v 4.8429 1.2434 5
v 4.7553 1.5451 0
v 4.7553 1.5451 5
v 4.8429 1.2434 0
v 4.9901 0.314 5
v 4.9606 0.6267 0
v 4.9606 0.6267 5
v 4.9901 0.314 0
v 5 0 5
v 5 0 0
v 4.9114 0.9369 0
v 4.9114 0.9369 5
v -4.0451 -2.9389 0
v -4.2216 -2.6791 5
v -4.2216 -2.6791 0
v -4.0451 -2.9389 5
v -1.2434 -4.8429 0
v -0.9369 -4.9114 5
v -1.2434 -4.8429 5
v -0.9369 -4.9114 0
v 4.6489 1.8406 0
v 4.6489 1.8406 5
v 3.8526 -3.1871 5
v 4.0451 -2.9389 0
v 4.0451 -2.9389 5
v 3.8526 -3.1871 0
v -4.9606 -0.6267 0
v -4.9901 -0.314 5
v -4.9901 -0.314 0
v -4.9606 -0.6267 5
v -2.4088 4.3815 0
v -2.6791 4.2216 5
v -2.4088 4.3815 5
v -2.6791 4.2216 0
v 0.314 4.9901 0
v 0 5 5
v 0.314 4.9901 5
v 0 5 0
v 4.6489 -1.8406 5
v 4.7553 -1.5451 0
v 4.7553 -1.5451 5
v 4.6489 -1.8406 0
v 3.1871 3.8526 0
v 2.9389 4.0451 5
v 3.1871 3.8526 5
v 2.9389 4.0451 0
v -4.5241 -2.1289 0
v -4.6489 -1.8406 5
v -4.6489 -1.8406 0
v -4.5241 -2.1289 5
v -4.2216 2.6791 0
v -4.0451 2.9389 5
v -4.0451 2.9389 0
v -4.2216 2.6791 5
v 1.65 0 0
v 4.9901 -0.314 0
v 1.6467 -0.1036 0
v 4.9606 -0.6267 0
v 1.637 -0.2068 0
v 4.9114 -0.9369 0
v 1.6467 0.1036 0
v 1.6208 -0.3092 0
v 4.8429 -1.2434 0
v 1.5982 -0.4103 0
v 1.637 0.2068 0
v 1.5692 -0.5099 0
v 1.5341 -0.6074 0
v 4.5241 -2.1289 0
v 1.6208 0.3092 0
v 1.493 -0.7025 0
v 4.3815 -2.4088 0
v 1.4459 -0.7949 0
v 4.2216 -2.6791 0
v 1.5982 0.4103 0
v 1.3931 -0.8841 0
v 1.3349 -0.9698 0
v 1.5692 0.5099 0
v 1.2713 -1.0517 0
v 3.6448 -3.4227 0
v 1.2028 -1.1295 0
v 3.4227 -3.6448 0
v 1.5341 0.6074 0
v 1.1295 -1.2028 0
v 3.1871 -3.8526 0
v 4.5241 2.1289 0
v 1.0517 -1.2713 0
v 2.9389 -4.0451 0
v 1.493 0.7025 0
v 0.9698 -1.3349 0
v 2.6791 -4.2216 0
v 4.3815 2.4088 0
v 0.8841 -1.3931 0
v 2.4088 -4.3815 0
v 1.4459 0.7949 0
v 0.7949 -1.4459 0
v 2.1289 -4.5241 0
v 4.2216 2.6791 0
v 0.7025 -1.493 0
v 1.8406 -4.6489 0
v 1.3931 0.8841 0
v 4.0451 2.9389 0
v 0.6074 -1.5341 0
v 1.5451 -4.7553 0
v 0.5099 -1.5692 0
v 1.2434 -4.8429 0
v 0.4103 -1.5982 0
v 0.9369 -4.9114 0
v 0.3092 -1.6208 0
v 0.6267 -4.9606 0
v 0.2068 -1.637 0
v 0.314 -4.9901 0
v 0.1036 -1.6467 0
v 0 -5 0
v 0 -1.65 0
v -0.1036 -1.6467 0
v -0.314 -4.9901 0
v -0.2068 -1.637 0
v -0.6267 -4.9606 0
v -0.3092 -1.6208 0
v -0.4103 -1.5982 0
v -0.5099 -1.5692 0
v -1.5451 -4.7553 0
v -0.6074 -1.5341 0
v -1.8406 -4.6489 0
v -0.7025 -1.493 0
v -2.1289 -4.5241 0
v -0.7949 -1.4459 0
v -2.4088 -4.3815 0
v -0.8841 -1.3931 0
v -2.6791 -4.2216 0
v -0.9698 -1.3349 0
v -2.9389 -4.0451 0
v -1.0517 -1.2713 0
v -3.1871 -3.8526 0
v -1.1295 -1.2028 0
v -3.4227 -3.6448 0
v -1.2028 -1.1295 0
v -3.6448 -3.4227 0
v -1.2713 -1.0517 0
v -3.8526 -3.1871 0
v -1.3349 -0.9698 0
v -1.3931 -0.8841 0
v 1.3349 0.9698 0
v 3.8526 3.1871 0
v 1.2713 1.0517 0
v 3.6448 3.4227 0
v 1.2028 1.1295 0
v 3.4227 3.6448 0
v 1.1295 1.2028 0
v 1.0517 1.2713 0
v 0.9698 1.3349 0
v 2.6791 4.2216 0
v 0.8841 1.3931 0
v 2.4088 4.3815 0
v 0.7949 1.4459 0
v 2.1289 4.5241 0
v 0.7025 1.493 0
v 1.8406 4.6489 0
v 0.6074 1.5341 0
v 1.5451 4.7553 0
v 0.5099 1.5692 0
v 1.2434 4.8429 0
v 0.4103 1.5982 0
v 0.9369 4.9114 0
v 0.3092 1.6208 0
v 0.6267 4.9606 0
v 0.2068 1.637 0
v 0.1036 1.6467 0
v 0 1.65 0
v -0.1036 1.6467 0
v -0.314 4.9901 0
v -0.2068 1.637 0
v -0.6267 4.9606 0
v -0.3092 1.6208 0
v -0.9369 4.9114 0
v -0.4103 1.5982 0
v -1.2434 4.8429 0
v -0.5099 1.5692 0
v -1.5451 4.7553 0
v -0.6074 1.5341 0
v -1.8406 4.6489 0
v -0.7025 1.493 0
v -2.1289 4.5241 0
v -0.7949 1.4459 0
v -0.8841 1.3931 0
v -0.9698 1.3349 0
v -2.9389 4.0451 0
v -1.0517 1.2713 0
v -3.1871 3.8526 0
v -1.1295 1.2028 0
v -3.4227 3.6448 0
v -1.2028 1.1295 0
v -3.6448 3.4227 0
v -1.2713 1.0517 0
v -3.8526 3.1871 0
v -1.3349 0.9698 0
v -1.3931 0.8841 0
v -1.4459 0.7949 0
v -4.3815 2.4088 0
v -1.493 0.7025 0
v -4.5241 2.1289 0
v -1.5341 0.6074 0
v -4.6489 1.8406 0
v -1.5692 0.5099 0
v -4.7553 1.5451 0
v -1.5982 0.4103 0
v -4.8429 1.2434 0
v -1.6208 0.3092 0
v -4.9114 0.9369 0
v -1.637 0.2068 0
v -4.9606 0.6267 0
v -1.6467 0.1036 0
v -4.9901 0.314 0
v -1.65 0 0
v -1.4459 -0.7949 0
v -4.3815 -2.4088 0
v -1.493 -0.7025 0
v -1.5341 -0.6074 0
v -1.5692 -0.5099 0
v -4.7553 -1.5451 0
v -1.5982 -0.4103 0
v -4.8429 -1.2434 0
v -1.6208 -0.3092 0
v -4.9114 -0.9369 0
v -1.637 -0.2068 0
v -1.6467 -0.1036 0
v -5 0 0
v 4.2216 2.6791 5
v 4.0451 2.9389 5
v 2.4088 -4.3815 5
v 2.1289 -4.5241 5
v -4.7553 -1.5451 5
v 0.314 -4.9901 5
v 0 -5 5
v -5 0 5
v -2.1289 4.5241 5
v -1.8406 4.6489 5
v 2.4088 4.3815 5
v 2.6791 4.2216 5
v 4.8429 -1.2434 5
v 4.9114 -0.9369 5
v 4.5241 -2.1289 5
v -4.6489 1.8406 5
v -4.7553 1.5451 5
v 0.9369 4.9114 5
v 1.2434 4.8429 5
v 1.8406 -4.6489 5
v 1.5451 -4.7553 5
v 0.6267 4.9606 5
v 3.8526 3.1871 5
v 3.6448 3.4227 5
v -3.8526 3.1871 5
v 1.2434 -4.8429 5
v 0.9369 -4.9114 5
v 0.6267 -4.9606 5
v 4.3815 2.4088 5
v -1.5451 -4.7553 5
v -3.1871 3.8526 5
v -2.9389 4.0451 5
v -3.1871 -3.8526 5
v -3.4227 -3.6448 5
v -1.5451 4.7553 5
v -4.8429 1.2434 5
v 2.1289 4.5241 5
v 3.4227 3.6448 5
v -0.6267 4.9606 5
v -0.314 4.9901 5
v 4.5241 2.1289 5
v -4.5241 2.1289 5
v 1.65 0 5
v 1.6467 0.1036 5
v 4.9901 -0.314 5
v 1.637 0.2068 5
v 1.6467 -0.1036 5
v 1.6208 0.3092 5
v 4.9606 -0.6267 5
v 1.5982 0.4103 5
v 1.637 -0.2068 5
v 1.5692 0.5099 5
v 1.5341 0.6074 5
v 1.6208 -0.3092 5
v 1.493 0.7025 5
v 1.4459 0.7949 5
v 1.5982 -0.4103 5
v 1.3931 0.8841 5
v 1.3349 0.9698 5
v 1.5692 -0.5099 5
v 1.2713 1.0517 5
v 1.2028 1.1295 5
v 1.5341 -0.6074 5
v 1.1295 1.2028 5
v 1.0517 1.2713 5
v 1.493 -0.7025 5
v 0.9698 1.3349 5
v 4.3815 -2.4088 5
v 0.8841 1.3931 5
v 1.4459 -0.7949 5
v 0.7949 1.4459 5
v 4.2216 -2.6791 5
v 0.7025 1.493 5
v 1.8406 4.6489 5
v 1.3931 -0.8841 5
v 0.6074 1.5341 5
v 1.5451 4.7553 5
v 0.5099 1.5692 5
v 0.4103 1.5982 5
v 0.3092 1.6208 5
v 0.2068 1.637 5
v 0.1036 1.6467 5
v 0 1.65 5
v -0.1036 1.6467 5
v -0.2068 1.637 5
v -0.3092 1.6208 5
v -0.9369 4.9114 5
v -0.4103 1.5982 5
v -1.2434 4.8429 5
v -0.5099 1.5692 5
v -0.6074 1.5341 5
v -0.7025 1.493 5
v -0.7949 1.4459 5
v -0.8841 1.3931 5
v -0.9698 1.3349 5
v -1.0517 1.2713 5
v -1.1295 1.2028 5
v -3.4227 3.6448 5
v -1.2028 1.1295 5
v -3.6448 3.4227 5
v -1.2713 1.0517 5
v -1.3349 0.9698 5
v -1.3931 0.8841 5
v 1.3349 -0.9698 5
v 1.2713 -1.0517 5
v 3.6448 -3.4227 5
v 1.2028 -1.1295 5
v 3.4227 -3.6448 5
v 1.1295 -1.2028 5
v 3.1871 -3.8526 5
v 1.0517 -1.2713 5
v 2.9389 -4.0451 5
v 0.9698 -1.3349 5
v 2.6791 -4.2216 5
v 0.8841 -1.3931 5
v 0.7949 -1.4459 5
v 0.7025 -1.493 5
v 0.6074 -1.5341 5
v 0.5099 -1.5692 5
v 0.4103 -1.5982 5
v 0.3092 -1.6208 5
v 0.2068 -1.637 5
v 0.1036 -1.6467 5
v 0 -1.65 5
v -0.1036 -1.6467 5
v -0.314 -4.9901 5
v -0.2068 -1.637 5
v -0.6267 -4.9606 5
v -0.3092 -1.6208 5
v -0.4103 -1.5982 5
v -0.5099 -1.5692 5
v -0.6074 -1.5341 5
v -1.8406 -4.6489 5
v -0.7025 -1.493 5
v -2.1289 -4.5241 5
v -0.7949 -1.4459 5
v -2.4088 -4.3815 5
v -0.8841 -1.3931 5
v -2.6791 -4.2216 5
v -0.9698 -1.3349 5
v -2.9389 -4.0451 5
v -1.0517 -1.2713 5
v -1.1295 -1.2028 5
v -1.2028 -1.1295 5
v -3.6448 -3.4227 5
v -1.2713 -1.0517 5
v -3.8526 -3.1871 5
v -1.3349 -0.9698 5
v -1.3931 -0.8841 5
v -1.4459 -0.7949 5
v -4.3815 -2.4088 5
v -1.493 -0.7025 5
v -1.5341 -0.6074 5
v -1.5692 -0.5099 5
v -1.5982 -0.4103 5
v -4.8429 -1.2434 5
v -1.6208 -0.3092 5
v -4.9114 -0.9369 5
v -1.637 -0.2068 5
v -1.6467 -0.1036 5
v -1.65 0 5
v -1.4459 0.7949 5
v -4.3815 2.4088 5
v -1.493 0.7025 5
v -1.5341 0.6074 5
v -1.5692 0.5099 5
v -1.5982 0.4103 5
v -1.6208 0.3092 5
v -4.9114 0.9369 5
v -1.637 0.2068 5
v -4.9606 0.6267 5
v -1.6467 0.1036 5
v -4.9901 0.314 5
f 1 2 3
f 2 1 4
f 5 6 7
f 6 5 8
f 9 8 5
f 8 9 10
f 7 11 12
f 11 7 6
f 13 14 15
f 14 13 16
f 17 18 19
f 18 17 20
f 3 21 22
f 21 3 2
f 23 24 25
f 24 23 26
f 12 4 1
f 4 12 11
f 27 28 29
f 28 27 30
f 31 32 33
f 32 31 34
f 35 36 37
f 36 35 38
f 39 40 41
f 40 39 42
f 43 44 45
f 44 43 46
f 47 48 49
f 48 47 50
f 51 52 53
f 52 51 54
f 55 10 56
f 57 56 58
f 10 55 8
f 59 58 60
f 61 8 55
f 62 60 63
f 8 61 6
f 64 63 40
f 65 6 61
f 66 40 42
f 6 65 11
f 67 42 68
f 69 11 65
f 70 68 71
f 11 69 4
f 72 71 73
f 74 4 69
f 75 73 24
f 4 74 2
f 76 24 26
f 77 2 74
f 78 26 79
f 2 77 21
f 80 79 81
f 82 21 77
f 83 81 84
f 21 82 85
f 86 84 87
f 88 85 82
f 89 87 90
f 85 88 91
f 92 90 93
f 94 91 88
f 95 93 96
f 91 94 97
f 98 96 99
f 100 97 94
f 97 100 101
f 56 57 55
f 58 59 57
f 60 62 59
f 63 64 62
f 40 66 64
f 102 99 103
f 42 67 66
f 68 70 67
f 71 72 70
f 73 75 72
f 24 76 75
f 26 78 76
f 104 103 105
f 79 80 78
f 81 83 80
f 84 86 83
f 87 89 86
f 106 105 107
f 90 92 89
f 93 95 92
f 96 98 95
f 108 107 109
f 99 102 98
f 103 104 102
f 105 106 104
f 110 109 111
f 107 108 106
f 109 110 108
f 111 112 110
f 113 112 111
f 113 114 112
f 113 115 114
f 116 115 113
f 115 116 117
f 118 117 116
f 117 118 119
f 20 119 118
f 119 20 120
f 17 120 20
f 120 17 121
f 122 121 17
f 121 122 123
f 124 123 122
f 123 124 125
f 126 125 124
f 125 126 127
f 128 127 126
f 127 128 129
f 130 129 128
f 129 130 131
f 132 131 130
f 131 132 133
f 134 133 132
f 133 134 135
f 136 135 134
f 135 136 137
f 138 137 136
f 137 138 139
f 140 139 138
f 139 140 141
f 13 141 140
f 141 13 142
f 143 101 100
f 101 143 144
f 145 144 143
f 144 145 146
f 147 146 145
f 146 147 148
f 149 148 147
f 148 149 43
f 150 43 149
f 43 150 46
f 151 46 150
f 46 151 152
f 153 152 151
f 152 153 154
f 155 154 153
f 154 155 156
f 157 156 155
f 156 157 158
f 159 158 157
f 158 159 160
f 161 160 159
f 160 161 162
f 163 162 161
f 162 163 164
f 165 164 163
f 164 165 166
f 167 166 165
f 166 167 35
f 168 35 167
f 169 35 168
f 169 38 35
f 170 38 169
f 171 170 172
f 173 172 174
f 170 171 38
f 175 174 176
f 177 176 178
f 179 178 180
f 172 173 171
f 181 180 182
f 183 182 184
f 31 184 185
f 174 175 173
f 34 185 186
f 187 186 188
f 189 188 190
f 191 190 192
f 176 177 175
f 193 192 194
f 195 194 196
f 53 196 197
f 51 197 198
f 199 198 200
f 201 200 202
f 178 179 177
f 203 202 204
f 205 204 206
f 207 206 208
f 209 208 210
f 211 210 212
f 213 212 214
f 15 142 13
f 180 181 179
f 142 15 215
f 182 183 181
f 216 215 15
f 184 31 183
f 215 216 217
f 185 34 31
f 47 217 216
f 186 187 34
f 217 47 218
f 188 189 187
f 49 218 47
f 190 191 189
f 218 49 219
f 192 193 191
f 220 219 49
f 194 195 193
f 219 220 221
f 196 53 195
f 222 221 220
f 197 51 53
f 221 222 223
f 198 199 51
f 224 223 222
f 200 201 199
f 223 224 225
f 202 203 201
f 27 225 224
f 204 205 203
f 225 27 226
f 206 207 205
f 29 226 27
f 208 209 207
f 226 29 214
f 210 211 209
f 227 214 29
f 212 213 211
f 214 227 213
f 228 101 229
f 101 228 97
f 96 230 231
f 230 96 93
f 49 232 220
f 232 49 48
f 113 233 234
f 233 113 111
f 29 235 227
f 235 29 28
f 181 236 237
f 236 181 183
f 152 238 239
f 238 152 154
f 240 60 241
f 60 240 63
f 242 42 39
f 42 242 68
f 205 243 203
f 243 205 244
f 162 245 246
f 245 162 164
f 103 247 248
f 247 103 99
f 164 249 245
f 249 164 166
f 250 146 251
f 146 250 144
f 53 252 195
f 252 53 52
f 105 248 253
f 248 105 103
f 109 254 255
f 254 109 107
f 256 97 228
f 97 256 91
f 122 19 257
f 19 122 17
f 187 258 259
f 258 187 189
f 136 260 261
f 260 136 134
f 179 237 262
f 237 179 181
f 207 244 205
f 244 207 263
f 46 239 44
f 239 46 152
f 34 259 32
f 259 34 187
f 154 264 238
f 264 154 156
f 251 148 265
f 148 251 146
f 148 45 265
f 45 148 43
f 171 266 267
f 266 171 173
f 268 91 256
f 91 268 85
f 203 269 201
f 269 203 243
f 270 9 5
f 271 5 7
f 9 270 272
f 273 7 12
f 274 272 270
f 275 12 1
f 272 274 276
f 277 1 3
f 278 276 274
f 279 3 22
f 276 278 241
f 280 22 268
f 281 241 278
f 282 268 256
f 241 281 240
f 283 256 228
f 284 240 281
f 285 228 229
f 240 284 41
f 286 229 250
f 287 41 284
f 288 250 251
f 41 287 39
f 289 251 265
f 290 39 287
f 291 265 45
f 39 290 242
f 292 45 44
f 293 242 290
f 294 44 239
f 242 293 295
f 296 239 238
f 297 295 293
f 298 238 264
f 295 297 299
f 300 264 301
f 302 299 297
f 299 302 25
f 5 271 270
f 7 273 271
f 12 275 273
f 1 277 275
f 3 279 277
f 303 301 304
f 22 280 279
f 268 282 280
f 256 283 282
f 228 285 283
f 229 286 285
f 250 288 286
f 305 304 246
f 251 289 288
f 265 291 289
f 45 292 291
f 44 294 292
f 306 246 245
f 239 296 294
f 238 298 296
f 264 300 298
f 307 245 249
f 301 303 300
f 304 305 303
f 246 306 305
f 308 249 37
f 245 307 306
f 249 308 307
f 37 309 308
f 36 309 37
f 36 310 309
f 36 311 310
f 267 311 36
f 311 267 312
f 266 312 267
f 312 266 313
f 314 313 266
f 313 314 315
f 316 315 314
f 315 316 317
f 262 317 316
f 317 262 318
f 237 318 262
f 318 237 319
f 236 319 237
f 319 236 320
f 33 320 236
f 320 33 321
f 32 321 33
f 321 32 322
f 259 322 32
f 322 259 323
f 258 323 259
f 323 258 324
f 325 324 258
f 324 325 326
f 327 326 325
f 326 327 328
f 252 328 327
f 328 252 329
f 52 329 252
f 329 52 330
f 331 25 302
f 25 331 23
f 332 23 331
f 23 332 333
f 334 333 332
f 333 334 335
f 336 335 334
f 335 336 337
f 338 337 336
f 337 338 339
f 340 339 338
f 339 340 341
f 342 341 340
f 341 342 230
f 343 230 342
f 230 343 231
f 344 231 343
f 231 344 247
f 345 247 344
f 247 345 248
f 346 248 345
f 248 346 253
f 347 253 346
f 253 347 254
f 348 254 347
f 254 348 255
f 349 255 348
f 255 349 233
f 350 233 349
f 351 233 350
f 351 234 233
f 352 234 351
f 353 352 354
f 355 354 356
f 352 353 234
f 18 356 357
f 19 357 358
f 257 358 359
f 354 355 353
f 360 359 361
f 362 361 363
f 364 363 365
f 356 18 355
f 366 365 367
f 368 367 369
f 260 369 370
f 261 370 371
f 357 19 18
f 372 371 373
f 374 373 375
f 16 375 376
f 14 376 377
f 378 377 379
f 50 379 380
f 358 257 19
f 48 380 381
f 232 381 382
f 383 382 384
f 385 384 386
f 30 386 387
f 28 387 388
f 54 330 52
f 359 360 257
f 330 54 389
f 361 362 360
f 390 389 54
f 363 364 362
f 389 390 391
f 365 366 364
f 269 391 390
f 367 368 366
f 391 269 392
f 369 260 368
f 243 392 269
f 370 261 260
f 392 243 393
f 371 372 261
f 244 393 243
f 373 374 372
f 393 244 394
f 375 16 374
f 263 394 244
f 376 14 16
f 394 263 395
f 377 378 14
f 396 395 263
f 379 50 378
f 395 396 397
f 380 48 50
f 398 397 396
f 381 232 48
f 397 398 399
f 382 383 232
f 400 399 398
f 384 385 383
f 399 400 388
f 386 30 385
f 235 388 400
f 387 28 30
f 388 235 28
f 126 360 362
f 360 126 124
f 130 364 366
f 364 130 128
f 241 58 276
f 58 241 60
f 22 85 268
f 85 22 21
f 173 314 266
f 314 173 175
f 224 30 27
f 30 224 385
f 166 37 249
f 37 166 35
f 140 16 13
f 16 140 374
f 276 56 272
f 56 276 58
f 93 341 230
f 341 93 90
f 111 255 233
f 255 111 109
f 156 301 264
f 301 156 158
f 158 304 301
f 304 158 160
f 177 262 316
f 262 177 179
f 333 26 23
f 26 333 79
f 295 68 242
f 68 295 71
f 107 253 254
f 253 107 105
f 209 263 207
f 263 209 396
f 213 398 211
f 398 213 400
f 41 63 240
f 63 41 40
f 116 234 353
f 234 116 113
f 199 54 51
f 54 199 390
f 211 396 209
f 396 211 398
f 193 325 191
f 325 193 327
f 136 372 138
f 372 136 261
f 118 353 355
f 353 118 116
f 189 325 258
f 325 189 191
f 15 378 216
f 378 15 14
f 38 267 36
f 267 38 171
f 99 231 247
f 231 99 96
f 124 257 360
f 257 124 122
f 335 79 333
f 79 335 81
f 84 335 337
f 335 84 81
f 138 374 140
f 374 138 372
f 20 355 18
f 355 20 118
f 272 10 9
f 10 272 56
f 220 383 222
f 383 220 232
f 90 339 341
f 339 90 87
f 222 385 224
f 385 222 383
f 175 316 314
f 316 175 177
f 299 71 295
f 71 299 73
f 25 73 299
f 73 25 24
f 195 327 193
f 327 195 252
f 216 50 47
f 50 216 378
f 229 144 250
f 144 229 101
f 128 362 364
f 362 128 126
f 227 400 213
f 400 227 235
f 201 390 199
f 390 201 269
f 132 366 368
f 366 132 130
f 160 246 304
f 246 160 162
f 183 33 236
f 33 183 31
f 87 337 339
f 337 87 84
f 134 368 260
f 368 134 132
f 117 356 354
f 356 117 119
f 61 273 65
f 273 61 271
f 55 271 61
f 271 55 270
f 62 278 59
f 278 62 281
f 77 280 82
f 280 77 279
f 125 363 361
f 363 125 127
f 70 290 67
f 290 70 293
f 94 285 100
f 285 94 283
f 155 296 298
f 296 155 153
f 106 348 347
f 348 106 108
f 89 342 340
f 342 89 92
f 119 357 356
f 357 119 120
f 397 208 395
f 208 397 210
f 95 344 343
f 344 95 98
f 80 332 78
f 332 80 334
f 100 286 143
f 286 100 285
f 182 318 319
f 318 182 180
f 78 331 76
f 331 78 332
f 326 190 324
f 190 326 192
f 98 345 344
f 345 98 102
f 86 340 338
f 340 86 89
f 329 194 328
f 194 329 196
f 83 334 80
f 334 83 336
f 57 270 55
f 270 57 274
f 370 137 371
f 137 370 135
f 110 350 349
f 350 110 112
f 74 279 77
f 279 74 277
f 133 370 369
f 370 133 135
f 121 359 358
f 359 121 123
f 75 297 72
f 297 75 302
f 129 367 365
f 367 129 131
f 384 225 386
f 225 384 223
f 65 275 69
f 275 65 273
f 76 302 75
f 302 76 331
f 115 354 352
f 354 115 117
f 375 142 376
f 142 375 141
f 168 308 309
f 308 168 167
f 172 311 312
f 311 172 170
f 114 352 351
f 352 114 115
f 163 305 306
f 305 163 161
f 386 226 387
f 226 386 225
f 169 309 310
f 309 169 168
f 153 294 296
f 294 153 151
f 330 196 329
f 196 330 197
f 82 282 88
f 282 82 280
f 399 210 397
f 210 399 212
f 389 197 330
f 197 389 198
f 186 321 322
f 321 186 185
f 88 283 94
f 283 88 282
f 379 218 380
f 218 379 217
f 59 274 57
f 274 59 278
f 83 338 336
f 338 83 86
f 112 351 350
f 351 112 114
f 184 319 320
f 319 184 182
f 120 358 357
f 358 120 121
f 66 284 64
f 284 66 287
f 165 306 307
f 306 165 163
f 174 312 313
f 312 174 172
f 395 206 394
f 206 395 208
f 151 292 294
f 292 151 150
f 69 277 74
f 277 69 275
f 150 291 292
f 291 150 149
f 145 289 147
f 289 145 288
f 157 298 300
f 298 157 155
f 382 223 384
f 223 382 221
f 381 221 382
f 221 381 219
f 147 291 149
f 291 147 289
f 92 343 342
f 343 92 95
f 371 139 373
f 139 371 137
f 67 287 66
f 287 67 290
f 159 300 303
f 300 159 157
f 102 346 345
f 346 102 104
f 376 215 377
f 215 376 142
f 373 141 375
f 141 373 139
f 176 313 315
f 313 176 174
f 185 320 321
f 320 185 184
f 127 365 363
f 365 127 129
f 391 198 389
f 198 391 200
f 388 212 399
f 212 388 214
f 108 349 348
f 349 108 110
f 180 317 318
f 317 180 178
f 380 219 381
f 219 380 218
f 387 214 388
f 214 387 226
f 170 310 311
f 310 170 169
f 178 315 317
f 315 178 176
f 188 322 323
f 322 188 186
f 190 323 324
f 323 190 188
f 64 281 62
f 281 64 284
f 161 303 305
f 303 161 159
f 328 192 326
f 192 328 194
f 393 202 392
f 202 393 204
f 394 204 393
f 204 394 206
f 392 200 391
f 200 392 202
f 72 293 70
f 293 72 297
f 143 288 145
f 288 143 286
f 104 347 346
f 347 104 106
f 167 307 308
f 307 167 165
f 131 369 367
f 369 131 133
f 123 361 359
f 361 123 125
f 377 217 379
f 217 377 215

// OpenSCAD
// PCB_Standoffs 
// For HMI PCB mounting to back plane

$fn = 100;
lowHeight = 5.0;
highHeight = 9.5;
m3Dia =  3.3;
extDia = 10.0;
rInt = m3Dia/2.0;
rExt = extDia/2.0;
epsilon=1;

module extCyl(height){
    cylinder(r=rExt,h=height, center=false);
}
module intCyl(height){
    translate([0,0,-epsilon/2.0])
        cylinder(r=rInt,h=height+epsilon, center=false);
}
module standoff(hi=false){
    h = hi ? highHeight : lowHeight;
    difference(){
        extCyl(h);
        intCyl(h);
    }
}
standoff(hi=false);
